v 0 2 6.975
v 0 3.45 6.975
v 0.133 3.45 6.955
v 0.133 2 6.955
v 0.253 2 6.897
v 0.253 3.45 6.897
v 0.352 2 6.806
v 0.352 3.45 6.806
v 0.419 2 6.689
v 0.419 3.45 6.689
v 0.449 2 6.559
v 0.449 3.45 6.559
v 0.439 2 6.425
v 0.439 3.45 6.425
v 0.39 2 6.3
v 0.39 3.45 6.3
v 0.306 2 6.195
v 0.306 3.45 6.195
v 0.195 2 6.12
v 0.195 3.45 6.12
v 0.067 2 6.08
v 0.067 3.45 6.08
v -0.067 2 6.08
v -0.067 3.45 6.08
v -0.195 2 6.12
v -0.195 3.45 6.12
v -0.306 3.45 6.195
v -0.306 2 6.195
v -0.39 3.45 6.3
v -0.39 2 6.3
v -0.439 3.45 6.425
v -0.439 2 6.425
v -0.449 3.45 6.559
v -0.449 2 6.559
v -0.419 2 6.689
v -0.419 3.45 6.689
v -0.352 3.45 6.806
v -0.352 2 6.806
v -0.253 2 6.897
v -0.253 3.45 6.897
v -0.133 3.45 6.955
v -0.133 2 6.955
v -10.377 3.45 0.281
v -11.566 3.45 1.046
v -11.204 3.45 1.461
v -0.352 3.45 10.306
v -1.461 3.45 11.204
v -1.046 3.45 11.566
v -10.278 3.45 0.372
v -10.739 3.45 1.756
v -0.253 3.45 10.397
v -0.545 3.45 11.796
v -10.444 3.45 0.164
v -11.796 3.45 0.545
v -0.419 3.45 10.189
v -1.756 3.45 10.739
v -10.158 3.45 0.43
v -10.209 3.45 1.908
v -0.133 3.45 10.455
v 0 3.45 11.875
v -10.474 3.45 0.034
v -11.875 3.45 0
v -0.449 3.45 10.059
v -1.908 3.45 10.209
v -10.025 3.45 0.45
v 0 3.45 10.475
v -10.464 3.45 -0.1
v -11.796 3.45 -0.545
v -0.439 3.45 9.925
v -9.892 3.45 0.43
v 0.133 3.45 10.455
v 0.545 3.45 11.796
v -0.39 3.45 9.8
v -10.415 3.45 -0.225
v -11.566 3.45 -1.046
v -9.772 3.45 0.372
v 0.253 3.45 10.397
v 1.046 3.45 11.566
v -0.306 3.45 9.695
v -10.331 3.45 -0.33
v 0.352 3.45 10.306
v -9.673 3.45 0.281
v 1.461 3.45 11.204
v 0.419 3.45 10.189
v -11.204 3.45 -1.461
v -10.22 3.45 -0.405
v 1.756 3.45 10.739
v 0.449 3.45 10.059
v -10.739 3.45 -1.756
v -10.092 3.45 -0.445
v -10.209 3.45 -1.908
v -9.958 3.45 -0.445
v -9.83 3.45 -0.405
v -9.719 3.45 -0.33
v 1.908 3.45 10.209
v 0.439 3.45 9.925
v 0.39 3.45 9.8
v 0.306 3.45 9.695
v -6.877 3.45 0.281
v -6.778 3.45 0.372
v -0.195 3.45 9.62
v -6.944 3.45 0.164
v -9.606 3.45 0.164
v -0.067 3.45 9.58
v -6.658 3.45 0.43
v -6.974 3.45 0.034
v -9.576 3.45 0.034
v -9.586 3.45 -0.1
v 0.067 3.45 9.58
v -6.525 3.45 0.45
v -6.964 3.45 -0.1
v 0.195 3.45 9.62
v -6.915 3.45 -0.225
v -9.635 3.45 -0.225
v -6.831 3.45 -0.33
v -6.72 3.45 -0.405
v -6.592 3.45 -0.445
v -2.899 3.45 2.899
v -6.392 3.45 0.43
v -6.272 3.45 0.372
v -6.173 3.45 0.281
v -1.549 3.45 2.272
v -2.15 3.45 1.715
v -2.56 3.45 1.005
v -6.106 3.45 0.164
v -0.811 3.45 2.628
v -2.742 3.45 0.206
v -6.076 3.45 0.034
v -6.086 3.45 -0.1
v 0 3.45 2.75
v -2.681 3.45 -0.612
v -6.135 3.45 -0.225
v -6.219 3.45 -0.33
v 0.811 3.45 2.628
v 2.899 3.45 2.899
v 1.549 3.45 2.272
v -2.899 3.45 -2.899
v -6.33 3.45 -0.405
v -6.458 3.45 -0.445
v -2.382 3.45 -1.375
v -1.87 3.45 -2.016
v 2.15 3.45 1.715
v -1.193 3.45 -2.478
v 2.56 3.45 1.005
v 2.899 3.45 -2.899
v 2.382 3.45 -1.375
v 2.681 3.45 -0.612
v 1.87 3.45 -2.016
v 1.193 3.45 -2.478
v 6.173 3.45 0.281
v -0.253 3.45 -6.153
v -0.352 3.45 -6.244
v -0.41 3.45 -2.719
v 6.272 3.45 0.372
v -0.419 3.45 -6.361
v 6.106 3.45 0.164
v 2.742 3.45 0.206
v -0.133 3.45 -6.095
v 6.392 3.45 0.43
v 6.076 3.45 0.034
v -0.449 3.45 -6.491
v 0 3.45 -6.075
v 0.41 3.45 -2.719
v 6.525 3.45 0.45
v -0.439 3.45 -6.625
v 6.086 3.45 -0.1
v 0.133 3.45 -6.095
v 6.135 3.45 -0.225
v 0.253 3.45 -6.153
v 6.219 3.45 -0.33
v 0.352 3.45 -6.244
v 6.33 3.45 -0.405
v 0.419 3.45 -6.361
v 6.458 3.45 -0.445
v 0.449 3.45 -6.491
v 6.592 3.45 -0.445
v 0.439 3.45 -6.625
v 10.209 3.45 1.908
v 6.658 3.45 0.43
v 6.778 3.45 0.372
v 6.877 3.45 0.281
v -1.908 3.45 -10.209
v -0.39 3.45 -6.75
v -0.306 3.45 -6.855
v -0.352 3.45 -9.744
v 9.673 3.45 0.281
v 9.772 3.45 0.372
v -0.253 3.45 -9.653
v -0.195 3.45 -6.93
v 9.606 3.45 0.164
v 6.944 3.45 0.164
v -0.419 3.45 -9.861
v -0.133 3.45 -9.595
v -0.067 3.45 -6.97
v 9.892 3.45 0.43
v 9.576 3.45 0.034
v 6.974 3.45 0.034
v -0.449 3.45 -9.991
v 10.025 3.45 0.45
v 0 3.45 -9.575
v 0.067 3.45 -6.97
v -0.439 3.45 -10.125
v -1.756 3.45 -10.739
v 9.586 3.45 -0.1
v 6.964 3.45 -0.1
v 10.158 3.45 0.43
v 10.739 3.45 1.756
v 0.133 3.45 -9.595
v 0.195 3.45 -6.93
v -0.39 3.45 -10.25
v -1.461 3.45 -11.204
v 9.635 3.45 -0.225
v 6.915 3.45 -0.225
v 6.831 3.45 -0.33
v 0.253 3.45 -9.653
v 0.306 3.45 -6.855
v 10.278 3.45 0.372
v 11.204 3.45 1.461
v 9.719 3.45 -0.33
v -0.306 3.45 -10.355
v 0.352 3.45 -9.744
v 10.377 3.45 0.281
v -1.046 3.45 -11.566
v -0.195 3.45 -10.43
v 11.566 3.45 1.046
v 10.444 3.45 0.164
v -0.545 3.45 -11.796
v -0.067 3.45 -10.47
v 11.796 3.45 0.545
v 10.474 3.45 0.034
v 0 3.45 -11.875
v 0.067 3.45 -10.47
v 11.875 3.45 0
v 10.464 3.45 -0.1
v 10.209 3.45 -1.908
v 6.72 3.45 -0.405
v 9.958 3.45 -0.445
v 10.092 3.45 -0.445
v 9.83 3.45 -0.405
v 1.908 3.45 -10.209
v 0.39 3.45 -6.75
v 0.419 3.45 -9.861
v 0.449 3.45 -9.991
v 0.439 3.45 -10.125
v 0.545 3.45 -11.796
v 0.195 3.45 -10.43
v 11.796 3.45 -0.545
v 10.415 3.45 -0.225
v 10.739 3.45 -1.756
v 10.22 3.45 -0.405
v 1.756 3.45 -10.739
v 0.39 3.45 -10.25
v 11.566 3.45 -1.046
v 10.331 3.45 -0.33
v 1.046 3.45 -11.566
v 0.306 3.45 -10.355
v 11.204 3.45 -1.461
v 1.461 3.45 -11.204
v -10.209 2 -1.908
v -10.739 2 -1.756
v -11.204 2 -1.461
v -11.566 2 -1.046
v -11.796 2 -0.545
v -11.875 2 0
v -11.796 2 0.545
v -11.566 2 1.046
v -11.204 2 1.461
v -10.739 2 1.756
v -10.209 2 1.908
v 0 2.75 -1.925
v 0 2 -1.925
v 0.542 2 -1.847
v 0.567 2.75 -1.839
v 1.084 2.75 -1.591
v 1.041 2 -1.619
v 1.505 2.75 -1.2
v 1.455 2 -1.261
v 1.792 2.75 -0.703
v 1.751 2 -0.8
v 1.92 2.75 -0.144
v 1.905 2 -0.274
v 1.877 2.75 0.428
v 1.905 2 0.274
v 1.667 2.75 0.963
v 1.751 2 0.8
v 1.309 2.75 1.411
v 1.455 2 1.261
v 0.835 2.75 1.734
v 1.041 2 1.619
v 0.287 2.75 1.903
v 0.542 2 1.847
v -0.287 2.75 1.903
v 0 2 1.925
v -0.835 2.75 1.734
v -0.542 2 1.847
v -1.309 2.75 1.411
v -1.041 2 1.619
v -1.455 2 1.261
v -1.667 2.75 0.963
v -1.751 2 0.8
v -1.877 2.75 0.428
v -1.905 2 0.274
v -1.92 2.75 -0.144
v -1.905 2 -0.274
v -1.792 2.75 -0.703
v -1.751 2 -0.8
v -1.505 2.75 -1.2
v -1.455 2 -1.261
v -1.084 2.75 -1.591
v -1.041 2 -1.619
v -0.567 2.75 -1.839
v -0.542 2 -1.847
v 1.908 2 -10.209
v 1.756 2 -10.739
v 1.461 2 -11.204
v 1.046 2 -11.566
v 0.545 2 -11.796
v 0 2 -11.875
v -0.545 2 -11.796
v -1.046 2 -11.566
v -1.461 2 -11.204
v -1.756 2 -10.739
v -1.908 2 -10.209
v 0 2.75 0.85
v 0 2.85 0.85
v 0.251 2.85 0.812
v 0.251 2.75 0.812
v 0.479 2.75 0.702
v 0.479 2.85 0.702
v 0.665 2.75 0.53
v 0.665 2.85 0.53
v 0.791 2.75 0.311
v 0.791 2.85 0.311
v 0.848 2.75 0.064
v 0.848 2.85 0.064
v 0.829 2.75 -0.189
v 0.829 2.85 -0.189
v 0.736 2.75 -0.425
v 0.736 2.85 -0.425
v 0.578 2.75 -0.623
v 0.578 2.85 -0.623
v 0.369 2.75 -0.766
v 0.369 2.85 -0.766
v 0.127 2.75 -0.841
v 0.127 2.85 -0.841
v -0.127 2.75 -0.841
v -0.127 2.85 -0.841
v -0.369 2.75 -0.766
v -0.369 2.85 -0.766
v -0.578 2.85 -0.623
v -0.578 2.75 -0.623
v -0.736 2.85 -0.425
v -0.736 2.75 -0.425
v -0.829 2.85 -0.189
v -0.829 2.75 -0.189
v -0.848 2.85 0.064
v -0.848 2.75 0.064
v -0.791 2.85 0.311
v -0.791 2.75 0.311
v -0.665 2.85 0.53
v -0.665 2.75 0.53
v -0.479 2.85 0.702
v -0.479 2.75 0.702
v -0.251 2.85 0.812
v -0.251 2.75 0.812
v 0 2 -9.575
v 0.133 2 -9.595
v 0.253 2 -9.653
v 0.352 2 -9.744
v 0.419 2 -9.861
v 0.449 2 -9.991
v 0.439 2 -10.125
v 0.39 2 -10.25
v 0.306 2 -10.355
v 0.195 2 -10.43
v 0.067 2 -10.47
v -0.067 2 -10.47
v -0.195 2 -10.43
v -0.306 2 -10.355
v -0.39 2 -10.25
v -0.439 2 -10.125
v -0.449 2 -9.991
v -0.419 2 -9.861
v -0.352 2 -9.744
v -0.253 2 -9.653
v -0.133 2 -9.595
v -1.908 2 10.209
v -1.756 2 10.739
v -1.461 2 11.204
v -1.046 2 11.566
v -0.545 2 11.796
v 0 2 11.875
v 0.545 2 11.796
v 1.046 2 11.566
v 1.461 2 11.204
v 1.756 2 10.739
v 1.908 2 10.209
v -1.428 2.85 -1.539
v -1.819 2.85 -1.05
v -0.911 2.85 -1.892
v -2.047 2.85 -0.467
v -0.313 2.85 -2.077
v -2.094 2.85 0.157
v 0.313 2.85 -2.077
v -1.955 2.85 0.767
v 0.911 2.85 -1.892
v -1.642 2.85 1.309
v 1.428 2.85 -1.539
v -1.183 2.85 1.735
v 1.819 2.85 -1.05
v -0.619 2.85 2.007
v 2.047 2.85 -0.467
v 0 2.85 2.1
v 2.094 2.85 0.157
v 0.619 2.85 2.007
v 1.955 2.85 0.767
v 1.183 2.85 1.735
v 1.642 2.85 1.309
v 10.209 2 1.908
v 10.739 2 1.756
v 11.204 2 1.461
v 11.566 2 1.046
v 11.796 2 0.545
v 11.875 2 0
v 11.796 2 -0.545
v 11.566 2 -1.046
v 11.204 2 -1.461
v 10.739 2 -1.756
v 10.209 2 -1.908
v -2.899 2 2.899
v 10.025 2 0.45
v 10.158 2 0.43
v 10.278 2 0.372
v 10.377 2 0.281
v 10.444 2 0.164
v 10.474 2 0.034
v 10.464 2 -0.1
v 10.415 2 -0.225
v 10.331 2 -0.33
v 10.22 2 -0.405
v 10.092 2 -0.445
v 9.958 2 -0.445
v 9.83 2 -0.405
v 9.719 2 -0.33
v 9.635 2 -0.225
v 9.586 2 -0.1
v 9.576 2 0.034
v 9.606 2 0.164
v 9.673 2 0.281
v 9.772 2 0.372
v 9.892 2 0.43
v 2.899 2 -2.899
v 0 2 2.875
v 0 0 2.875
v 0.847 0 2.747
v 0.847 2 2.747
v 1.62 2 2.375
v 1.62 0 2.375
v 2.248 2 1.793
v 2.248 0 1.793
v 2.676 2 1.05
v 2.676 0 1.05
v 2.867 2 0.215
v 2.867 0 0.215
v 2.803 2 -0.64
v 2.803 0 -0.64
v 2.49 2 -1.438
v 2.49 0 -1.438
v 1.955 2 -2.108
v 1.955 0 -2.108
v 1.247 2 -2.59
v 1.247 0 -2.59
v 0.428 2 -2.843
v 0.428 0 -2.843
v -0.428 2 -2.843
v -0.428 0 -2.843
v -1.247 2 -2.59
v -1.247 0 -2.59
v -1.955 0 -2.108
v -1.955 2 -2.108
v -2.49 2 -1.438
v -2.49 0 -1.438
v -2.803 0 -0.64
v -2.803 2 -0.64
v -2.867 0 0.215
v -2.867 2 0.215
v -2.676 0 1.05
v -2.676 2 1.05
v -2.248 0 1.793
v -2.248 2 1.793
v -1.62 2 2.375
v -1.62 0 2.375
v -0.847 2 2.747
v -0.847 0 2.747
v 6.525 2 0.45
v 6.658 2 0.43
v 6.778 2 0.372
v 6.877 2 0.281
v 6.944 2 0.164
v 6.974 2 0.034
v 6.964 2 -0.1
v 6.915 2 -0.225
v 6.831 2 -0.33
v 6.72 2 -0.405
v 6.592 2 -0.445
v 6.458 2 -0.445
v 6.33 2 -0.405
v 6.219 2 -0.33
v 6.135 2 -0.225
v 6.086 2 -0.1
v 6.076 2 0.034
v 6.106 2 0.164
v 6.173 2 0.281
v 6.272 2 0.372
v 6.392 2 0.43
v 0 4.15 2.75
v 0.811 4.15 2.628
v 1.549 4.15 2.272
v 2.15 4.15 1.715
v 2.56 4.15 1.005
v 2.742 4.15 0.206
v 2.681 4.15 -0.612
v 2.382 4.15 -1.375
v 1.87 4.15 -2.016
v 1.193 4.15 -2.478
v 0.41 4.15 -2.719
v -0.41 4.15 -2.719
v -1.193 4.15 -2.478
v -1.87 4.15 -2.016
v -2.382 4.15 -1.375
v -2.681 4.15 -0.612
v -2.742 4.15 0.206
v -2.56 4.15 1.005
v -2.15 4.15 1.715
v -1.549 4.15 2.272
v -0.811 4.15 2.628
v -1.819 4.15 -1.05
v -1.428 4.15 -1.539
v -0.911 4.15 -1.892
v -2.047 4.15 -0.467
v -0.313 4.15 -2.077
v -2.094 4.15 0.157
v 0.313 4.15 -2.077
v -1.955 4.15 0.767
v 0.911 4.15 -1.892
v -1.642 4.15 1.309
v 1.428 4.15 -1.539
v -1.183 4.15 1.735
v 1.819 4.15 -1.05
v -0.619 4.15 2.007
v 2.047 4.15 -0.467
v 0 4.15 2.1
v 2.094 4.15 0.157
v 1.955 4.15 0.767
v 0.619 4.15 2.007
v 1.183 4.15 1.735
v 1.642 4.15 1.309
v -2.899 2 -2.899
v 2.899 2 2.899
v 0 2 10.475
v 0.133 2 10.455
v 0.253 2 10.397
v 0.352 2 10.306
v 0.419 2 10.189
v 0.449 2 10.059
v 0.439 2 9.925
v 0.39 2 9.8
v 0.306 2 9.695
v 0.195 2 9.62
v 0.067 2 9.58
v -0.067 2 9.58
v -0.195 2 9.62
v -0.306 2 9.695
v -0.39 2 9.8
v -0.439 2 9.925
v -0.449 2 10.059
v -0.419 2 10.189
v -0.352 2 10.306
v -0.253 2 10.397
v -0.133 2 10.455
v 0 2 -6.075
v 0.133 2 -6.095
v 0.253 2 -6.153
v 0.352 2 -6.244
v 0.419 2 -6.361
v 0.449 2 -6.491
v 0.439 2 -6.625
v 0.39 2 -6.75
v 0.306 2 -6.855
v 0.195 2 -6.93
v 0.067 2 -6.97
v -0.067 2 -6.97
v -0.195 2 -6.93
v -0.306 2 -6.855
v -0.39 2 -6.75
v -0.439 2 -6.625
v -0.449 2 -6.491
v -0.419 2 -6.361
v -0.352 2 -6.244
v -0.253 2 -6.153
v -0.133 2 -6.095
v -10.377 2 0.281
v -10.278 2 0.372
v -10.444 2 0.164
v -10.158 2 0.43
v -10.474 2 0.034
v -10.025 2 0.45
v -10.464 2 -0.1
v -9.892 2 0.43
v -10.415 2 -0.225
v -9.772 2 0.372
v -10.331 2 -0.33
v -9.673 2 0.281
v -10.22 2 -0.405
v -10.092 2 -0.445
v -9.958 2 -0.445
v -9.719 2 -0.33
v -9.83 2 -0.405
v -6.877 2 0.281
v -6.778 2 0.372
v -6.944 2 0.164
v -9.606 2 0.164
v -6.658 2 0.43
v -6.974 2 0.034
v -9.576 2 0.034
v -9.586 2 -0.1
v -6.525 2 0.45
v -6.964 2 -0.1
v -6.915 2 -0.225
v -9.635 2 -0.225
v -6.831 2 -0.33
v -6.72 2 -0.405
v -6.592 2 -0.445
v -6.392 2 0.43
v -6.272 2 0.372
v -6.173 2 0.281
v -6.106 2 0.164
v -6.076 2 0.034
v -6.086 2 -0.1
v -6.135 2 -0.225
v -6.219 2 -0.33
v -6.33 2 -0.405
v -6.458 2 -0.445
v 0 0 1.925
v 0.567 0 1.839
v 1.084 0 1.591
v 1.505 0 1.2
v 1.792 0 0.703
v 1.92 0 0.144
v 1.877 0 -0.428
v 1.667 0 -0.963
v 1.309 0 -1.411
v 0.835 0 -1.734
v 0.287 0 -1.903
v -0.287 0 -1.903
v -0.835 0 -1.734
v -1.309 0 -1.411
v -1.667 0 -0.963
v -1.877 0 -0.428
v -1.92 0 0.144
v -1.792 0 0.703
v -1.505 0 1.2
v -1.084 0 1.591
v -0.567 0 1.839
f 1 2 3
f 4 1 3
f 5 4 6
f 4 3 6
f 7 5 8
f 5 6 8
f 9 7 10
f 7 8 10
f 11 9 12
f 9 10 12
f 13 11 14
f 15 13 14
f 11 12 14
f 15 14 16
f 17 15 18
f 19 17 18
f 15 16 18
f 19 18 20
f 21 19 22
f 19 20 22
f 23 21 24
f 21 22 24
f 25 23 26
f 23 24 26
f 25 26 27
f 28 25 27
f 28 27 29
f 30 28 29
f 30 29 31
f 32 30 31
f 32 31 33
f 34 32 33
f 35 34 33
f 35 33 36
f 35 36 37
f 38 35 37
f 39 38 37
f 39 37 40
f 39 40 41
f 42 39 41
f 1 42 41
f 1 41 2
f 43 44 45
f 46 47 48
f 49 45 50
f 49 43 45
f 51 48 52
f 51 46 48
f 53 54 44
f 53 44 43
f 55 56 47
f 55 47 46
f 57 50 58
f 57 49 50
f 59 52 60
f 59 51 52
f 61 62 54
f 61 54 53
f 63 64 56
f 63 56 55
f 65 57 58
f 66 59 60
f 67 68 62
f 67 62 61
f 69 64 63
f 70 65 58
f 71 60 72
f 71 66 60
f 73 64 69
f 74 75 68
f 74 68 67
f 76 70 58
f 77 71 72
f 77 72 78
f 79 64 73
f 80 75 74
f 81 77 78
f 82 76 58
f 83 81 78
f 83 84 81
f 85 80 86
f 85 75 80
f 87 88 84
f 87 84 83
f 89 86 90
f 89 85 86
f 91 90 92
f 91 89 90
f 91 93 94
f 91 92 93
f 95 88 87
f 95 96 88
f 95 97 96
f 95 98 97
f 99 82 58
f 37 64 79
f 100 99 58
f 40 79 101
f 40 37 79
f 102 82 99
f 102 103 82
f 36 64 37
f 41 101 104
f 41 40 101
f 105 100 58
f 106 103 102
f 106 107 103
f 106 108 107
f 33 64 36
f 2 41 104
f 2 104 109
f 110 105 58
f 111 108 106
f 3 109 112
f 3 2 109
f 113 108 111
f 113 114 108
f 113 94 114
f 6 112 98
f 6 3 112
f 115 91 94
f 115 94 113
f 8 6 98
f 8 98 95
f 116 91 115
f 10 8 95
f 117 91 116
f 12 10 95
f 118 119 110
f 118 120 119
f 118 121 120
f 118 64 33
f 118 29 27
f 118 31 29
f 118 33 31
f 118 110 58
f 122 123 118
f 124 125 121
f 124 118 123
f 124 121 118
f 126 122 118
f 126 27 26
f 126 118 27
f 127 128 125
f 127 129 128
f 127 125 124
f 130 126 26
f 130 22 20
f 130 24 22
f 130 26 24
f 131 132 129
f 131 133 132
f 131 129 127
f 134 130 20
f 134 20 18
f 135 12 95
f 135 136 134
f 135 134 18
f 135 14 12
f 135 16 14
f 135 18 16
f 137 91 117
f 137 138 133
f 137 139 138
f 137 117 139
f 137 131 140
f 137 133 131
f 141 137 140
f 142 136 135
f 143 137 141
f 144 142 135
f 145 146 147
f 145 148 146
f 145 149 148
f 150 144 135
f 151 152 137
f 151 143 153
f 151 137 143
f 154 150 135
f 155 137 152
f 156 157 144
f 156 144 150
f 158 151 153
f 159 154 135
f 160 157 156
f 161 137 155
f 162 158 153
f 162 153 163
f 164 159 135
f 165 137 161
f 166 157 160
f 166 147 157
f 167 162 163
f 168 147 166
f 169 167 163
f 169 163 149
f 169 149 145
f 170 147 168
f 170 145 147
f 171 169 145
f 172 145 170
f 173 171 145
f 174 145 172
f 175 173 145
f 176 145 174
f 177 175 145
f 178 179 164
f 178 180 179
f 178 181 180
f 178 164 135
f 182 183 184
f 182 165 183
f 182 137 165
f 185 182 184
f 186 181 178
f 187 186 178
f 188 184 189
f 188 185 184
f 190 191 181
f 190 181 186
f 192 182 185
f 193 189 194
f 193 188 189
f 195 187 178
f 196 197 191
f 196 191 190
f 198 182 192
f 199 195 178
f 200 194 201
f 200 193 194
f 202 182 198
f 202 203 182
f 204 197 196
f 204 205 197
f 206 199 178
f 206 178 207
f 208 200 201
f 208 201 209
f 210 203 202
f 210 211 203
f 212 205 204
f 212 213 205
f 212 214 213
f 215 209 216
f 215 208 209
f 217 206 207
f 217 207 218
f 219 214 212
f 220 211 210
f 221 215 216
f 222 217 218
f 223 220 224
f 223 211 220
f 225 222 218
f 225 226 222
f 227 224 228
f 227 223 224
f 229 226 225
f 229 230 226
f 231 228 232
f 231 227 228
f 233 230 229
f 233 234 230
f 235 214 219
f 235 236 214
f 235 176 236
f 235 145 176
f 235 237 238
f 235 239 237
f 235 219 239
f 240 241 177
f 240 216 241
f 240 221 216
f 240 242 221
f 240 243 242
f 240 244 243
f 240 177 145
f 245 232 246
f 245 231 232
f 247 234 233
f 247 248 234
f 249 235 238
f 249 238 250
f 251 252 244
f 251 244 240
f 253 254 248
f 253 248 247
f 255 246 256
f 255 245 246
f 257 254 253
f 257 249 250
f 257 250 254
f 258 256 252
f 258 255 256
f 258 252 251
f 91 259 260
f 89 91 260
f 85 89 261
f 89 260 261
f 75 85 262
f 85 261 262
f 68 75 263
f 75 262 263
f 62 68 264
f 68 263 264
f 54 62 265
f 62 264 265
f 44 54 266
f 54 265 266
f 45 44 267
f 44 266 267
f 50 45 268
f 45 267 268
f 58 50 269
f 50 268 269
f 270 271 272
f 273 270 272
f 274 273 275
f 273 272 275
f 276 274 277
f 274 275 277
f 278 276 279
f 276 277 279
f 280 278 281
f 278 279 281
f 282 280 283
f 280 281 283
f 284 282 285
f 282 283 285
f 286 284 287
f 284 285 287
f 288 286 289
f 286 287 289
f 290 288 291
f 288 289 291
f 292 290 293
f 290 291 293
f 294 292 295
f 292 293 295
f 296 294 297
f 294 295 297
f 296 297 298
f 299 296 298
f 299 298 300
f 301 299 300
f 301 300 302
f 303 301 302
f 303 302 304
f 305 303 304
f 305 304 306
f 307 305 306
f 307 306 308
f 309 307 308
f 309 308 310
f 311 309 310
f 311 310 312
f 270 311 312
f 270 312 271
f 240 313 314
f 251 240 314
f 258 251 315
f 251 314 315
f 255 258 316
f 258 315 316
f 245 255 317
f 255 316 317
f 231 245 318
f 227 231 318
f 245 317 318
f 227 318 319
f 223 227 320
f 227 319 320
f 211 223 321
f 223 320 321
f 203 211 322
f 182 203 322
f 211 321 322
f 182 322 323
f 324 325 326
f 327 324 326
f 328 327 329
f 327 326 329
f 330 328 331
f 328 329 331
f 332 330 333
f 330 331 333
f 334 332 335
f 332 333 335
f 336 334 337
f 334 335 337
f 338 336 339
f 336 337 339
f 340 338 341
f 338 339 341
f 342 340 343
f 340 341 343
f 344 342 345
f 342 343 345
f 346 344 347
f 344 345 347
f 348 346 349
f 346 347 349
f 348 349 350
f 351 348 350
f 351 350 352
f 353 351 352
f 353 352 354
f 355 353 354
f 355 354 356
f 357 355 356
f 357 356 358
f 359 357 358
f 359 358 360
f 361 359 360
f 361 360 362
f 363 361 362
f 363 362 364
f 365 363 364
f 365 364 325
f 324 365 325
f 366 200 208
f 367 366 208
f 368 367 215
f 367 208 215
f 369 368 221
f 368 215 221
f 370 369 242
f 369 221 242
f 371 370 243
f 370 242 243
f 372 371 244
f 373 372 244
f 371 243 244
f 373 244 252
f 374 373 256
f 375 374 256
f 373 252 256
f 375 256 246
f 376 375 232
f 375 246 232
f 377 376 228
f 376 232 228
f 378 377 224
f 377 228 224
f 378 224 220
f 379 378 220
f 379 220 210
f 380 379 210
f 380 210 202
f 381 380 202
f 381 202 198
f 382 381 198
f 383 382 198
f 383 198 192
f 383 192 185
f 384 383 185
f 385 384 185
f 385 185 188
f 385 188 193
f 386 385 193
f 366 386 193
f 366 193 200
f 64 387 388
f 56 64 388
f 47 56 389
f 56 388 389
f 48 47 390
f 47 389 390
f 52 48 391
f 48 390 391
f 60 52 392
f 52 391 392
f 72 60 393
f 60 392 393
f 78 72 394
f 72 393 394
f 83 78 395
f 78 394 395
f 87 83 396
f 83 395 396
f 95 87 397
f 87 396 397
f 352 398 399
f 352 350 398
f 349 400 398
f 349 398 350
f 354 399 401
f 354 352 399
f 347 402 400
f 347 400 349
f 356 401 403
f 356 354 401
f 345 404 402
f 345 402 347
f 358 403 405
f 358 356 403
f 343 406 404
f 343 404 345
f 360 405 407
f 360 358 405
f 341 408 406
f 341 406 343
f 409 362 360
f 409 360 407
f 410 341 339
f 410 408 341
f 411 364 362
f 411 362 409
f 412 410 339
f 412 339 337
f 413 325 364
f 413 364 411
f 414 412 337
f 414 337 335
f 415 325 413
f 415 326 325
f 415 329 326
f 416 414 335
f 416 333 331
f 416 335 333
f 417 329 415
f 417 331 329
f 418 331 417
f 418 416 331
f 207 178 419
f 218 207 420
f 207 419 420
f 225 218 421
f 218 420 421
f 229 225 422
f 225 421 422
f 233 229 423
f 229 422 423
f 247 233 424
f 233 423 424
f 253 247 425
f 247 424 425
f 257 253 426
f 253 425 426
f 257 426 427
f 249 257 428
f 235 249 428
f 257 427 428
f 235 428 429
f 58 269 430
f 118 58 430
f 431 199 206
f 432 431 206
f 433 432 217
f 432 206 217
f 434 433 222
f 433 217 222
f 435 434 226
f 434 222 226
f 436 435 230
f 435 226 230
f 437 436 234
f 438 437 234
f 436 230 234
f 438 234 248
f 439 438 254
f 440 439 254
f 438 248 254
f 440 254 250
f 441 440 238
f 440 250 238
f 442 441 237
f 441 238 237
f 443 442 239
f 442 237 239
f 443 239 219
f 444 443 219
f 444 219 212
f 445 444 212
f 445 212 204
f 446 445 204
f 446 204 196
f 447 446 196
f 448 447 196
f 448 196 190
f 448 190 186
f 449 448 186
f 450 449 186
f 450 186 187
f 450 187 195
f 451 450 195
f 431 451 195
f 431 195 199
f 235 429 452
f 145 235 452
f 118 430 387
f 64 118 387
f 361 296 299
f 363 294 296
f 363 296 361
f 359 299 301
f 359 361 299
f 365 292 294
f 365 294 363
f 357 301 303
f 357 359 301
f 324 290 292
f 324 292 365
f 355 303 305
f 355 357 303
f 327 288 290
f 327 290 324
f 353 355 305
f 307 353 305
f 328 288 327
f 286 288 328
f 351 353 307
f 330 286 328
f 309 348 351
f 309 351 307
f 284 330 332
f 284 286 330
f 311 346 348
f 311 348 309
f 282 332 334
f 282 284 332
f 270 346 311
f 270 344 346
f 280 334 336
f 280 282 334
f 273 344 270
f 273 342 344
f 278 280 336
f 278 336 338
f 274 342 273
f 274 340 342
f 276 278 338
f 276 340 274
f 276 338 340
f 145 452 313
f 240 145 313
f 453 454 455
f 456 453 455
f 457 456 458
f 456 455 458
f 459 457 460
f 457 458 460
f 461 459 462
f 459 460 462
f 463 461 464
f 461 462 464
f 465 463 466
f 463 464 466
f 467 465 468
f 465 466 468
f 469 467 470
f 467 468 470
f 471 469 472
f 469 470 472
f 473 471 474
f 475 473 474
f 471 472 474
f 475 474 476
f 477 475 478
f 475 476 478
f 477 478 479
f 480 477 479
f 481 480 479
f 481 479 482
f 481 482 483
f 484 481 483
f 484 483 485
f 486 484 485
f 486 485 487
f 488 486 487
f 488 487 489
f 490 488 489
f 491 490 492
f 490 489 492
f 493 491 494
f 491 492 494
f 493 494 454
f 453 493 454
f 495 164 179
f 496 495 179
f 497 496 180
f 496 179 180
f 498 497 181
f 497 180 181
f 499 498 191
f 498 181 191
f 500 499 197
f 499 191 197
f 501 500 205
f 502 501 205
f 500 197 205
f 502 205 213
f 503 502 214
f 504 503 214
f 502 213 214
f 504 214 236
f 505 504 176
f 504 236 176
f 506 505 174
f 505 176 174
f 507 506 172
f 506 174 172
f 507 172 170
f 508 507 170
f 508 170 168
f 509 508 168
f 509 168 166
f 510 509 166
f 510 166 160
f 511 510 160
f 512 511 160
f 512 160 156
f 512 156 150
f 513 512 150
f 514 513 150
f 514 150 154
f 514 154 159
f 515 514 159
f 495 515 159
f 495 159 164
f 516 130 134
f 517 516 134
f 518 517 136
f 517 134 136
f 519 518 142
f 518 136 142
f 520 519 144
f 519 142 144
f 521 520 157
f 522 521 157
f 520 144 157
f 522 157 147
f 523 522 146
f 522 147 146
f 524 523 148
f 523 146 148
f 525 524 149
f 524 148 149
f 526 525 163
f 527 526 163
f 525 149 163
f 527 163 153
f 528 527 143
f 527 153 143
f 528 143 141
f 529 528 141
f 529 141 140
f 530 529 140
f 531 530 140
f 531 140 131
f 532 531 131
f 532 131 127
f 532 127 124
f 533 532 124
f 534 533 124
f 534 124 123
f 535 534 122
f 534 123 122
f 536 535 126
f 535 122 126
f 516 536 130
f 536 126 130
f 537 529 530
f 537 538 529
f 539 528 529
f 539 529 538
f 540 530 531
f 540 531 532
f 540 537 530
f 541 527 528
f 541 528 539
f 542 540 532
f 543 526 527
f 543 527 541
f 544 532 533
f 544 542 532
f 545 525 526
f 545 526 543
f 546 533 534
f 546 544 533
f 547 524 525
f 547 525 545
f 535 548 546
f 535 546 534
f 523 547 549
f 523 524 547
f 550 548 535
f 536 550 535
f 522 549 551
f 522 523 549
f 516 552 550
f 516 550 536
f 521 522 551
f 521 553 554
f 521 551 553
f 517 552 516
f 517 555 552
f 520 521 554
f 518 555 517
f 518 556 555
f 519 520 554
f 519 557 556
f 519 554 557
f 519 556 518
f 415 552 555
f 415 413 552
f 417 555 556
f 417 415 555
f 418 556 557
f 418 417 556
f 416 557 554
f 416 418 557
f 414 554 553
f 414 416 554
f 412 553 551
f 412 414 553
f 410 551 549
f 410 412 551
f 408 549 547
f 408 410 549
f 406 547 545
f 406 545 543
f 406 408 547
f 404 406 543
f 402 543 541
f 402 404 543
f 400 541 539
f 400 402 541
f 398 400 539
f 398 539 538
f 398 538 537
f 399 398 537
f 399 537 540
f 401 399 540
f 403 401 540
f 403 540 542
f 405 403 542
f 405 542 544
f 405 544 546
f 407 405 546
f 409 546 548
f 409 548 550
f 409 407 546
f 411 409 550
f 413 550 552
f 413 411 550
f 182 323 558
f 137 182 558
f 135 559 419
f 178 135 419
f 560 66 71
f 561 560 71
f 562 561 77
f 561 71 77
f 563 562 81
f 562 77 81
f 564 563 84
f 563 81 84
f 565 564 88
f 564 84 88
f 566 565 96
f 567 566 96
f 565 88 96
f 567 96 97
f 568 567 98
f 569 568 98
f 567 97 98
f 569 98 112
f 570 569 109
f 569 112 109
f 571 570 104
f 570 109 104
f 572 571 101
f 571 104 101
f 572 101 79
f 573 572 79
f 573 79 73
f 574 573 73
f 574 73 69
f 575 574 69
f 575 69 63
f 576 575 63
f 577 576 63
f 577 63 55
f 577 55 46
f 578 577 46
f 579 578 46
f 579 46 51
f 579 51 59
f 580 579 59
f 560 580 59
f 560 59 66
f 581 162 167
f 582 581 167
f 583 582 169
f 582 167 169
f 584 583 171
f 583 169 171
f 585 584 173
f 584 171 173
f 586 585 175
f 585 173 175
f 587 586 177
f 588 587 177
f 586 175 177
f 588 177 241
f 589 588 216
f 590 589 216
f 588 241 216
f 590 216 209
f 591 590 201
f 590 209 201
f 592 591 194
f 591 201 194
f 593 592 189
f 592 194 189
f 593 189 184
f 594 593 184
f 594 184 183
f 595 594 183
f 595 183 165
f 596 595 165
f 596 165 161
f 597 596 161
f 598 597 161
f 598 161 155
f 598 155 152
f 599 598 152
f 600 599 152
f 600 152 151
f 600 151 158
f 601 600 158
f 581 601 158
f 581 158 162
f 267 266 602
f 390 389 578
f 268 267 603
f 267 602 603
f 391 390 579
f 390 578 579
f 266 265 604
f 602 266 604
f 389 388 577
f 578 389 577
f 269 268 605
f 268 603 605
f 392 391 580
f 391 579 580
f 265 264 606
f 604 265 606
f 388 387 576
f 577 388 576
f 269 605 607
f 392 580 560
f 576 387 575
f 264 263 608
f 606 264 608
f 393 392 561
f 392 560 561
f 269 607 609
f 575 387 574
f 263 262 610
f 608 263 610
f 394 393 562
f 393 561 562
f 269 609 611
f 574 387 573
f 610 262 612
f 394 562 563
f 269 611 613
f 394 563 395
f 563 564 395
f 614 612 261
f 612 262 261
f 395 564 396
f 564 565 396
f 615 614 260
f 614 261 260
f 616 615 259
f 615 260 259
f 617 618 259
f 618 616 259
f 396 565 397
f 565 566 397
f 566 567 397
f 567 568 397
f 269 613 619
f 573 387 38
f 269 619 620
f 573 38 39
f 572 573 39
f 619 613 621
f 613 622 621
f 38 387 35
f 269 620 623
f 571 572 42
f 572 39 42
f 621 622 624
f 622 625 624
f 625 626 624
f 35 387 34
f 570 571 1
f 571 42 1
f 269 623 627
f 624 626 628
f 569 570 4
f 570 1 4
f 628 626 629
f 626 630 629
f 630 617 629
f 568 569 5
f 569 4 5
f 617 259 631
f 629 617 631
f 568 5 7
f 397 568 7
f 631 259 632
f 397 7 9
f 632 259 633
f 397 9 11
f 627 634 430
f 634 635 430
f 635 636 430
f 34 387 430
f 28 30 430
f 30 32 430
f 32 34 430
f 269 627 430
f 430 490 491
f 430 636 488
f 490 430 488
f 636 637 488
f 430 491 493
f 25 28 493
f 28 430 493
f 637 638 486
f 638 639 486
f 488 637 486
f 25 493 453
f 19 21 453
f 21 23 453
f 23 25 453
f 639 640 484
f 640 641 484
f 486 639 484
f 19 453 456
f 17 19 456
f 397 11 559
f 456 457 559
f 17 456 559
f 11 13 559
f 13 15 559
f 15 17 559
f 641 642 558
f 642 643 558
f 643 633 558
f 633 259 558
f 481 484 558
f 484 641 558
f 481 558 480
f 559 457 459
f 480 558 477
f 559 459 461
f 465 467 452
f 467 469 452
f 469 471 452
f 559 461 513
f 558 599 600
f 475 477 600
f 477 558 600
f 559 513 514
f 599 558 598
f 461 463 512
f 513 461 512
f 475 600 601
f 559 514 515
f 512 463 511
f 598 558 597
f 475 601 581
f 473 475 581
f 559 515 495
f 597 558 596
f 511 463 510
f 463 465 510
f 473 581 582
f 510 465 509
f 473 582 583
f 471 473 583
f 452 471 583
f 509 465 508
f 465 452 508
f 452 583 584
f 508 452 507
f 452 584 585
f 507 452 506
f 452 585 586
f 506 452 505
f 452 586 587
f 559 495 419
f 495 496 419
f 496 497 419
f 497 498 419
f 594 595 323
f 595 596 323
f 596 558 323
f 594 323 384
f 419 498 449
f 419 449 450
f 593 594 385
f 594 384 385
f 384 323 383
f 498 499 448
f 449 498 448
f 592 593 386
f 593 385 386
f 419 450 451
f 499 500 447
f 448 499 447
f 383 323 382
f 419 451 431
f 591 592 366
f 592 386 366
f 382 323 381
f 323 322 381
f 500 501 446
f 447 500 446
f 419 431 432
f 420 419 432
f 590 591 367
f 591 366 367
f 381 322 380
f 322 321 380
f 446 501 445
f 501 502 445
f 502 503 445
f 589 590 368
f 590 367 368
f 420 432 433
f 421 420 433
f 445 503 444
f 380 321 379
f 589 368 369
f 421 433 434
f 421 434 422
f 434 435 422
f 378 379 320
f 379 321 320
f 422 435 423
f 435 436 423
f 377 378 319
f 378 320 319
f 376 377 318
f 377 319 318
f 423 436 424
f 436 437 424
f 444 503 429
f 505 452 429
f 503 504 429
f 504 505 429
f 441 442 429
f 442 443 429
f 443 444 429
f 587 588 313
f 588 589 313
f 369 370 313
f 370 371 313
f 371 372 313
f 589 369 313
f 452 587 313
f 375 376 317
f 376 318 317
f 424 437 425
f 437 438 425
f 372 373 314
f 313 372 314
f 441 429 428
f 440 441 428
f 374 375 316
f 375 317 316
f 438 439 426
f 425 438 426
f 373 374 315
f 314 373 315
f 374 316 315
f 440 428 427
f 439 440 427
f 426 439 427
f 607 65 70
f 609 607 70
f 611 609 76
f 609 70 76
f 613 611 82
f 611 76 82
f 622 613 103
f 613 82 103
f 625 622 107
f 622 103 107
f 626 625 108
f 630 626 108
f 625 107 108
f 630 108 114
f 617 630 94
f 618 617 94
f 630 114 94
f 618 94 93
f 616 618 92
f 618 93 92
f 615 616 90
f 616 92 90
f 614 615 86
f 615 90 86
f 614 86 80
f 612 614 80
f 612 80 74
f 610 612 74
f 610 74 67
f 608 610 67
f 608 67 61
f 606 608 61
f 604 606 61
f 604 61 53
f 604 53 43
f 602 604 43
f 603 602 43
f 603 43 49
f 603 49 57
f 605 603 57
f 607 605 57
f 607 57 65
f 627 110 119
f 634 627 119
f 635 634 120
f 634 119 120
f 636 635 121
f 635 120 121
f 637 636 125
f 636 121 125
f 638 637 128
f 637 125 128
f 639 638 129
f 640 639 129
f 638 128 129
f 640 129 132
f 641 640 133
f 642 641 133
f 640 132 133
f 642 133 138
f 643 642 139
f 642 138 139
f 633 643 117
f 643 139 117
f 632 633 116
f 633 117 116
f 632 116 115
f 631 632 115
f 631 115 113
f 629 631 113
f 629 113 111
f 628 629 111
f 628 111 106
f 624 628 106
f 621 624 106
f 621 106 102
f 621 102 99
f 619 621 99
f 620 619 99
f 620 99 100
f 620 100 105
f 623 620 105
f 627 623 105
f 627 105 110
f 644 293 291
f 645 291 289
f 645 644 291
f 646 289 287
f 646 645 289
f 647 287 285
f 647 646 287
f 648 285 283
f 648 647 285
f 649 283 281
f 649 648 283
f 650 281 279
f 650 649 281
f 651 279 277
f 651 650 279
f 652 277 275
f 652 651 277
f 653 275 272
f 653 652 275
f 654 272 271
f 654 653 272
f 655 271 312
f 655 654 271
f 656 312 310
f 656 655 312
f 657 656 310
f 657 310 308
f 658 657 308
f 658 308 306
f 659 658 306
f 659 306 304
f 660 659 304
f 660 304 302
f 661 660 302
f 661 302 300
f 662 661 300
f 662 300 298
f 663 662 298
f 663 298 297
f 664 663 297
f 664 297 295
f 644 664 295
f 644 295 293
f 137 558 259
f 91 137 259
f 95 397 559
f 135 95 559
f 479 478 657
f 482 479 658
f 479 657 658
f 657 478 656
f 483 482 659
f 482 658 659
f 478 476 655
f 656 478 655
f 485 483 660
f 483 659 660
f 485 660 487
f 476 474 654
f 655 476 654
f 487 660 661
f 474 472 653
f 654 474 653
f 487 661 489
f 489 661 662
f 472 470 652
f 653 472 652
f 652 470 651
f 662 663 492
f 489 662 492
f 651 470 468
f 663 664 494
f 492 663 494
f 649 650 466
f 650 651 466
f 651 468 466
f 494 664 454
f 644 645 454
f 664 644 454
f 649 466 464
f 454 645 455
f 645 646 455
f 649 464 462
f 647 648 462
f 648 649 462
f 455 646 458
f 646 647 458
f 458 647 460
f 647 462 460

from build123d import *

# Parameters (mm, degrees)
SKETCH1_R           = 2.875
SKETCH1_R_2         = 1.925
BOSS_EXTRUDE1_DEPTH = 2
SKETCH2_R           = 1.925
SKETCH2_R_2         = 2.875
BOSS_EXTRUDE2_DEPTH = 1.45
SKETCH3_R           = 2.75
SKETCH3_R_2         = 2.1
BOSS_EXTRUDE3_DEPTH = 0.7
CUT_EXTRUDE1_START  = -1.3
SKETCH5_R           = 2.1
CUT_EXTRUDE1_DEPTH  = 1.3
SKETCH6_R           = 0.85
CUT_EXTRUDE2_DEPTH  = 18.033900023
SKETCH7_R           = 0.45
CUT_EXTRUDE3_DEPTH  = 18.144496201
SKETCH8_R           = 1.925
CUT_EXTRUDE4_DEPTH  = 0.75


with BuildPart() as part:
    # Sketch1 → Boss-Extrude1 (new body)
    with BuildSketch(Plane(origin=(0, 0, 0), x_dir=(1, 0, 0), z_dir=(0, 1, 0))):
        with Locations(Location((0, 0, 0), (0, 0, 270))):
            Circle(SKETCH1_R)
        with Locations(Location((0, 0, 0), (0, 0, 270))):
            Circle(SKETCH1_R_2, mode=Mode.SUBTRACT)
    extrude(amount=BOSS_EXTRUDE1_DEPTH)

    # Sketch2 → Boss-Extrude2 (add)
    # profile 1 of 7: a face of its own
    with BuildSketch(Plane(origin=(0, 2, 0), x_dir=(1, 0, 0), z_dir=(0, 1, 0))):
        with Locations((-9.95, 0)):
            Circle(SKETCH2_R)
    # profile 2 of 7: a face of its own
    with BuildSketch(Plane(origin=(0, 2, 0), x_dir=(1, 0, 0), z_dir=(0, 1, 0))):
        with BuildLine():
            ThreePointArc((1.925, 9.95), (-0.129680261, 8.029373011), (-1.907527823, 10.208771335))
            Line((-1.907527823, 10.208771335), (-2.899137803, 2.899137803))
            Line((-2.899137803, 2.899137803), (-10.208771335, 1.907527823))
            ThreePointArc((-10.208771335, 1.907527823), (-8.683609424, 1.44978616), (-8.025, 0))
            ThreePointArc((-8.025, 0), (-8.683609424, -1.44978616), (-10.208771335, -1.907527823))
            Line((-10.208771335, -1.907527823), (-2.899137803, -2.899137803))
            Line((-2.899137803, -2.899137803), (-1.907527823, -10.208771335))
            ThreePointArc((-1.907527823, -10.208771335), (-0.129680261, -8.029373011), (1.925, -9.95))
            ThreePointArc((1.925, -9.95), (1.920626989, -10.079680261), (1.907527823, -10.208771335))
            Line((1.907527823, -10.208771335), (2.899137803, -2.899137803))
            Line((2.899137803, -2.899137803), (10.208771335, -1.907527823))
            ThreePointArc((10.208771335, -1.907527823), (8.025, 0), (10.208771335, 1.907527823))
            Line((10.208771335, 1.907527823), (2.899137803, 2.899137803))
            Line((2.899137803, 2.899137803), (1.907527823, 10.208771335))
            ThreePointArc((1.907527823, 10.208771335), (1.920626989, 10.079680261), (1.925, 9.95))
        make_face()
        with Locations(Location((0, 0, 0), (0, 0, 270))):
            Circle(SKETCH2_R_2, mode=Mode.SUBTRACT)
    # profile 3 of 7: a face of its own
    with BuildSketch(Plane(origin=(0, 2, 0), x_dir=(1, 0, 0), z_dir=(0, 1, 0))):
        with Locations(Location((0, 0, 0), (0, 0, 270))):
            Circle(SKETCH2_R_2)
        with Locations(Location((0, 0, 0), (0, 0, 270))):
            Circle(SKETCH2_R, mode=Mode.SUBTRACT)
    # profile 4 of 7: a face of its own
    with BuildSketch(Plane(origin=(0, 2, 0), x_dir=(1, 0, 0), z_dir=(0, 1, 0))):
        with Locations(Location((0, 0, 0), (0, 0, 270))):
            Circle(SKETCH2_R)
    # profile 5 of 7: a face of its own
    with BuildSketch(Plane(origin=(0, 2, 0), x_dir=(1, 0, 0), z_dir=(0, 1, 0))):
        with Locations((0, -9.95)):
            Circle(SKETCH2_R)
    # profile 6 of 7: a face of its own
    with BuildSketch(Plane(origin=(0, 2, 0), x_dir=(1, 0, 0), z_dir=(0, 1, 0))):
        with Locations((9.95, 0)):
            Circle(SKETCH2_R)
    # profile 7 of 7: a face of its own
    with BuildSketch(Plane(origin=(0, 2, 0), x_dir=(1, 0, 0), z_dir=(0, 1, 0))):
        with Locations((0, 9.95)):
            Circle(SKETCH2_R)
    extrude(amount=BOSS_EXTRUDE2_DEPTH)

    # Sketch3 → Boss-Extrude3 (add)
    with BuildSketch(Plane(origin=(0, 3.45, 0), x_dir=(1, 0, 0), z_dir=(0, 1, 0))):
        with Locations(Location((0, 0, 0), (0, 0, 270))):
            Circle(SKETCH3_R)
        with Locations(Location((0, 0, 0), (0, 0, 270))):
            Circle(SKETCH3_R_2, mode=Mode.SUBTRACT)
    extrude(amount=BOSS_EXTRUDE3_DEPTH)

    # Sketch5 → Cut-Extrude1 (cut)
    with BuildSketch(Plane(origin=(0, 4.15, 0), x_dir=(1, 0, 0), z_dir=(0, 1, 0)).offset(CUT_EXTRUDE1_START)):
        with Locations(Location((0, 0, 0), (0, 0, 270))):
            Circle(SKETCH5_R)
    extrude(amount=CUT_EXTRUDE1_DEPTH, mode=Mode.SUBTRACT)

    # Sketch6 → Cut-Extrude2 (cut, through all)
    with BuildSketch(Plane(origin=(0, 2.85, 0), x_dir=(1, 0, 0), z_dir=(0, 1, 0))):
        with Locations(Location((0, 0, 0), (0, 0, 270))):
            Circle(SKETCH6_R)
    extrude(amount=-CUT_EXTRUDE2_DEPTH, mode=Mode.SUBTRACT)

    # Sketch7 → Cut-Extrude3 (cut, through all)
    with BuildSketch(Plane(origin=(0, 3.45, 0), x_dir=(1, 0, 0), z_dir=(0, 1, 0))):
        with Locations(Location((0, 10.025, 0), (0, 0, 270))):
            Circle(SKETCH7_R)
        with Locations(Location((0, 6.525, 0), (0, 0, 270))):
            Circle(SKETCH7_R)
        with Locations(Location((6.525, 0, 0), (0, 0, 270))):
            Circle(SKETCH7_R)
        with Locations(Location((10.025, 0, 0), (0, 0, 270))):
            Circle(SKETCH7_R)
        with Locations(Location((0, -6.525, 0), (0, 0, 270))):
            Circle(SKETCH7_R)
        with Locations(Location((0, -10.025, 0), (0, 0, 270))):
            Circle(SKETCH7_R)
        with Locations(Location((-6.525, 0, 0), (0, 0, 270))):
            Circle(SKETCH7_R)
        with Locations(Location((-10.025, 0, 0), (0, 0, 270))):
            Circle(SKETCH7_R)
    extrude(amount=-CUT_EXTRUDE3_DEPTH, mode=Mode.SUBTRACT)

    # Sketch8 → Cut-Extrude4 (cut)
    with BuildSketch(Plane.XZ.offset(-2)):
        with Locations(Location((0, 0, 0), (0, 0, 270))):
            Circle(SKETCH8_R)
    extrude(amount=-CUT_EXTRUDE4_DEPTH, mode=Mode.SUBTRACT)


solid = part.part
